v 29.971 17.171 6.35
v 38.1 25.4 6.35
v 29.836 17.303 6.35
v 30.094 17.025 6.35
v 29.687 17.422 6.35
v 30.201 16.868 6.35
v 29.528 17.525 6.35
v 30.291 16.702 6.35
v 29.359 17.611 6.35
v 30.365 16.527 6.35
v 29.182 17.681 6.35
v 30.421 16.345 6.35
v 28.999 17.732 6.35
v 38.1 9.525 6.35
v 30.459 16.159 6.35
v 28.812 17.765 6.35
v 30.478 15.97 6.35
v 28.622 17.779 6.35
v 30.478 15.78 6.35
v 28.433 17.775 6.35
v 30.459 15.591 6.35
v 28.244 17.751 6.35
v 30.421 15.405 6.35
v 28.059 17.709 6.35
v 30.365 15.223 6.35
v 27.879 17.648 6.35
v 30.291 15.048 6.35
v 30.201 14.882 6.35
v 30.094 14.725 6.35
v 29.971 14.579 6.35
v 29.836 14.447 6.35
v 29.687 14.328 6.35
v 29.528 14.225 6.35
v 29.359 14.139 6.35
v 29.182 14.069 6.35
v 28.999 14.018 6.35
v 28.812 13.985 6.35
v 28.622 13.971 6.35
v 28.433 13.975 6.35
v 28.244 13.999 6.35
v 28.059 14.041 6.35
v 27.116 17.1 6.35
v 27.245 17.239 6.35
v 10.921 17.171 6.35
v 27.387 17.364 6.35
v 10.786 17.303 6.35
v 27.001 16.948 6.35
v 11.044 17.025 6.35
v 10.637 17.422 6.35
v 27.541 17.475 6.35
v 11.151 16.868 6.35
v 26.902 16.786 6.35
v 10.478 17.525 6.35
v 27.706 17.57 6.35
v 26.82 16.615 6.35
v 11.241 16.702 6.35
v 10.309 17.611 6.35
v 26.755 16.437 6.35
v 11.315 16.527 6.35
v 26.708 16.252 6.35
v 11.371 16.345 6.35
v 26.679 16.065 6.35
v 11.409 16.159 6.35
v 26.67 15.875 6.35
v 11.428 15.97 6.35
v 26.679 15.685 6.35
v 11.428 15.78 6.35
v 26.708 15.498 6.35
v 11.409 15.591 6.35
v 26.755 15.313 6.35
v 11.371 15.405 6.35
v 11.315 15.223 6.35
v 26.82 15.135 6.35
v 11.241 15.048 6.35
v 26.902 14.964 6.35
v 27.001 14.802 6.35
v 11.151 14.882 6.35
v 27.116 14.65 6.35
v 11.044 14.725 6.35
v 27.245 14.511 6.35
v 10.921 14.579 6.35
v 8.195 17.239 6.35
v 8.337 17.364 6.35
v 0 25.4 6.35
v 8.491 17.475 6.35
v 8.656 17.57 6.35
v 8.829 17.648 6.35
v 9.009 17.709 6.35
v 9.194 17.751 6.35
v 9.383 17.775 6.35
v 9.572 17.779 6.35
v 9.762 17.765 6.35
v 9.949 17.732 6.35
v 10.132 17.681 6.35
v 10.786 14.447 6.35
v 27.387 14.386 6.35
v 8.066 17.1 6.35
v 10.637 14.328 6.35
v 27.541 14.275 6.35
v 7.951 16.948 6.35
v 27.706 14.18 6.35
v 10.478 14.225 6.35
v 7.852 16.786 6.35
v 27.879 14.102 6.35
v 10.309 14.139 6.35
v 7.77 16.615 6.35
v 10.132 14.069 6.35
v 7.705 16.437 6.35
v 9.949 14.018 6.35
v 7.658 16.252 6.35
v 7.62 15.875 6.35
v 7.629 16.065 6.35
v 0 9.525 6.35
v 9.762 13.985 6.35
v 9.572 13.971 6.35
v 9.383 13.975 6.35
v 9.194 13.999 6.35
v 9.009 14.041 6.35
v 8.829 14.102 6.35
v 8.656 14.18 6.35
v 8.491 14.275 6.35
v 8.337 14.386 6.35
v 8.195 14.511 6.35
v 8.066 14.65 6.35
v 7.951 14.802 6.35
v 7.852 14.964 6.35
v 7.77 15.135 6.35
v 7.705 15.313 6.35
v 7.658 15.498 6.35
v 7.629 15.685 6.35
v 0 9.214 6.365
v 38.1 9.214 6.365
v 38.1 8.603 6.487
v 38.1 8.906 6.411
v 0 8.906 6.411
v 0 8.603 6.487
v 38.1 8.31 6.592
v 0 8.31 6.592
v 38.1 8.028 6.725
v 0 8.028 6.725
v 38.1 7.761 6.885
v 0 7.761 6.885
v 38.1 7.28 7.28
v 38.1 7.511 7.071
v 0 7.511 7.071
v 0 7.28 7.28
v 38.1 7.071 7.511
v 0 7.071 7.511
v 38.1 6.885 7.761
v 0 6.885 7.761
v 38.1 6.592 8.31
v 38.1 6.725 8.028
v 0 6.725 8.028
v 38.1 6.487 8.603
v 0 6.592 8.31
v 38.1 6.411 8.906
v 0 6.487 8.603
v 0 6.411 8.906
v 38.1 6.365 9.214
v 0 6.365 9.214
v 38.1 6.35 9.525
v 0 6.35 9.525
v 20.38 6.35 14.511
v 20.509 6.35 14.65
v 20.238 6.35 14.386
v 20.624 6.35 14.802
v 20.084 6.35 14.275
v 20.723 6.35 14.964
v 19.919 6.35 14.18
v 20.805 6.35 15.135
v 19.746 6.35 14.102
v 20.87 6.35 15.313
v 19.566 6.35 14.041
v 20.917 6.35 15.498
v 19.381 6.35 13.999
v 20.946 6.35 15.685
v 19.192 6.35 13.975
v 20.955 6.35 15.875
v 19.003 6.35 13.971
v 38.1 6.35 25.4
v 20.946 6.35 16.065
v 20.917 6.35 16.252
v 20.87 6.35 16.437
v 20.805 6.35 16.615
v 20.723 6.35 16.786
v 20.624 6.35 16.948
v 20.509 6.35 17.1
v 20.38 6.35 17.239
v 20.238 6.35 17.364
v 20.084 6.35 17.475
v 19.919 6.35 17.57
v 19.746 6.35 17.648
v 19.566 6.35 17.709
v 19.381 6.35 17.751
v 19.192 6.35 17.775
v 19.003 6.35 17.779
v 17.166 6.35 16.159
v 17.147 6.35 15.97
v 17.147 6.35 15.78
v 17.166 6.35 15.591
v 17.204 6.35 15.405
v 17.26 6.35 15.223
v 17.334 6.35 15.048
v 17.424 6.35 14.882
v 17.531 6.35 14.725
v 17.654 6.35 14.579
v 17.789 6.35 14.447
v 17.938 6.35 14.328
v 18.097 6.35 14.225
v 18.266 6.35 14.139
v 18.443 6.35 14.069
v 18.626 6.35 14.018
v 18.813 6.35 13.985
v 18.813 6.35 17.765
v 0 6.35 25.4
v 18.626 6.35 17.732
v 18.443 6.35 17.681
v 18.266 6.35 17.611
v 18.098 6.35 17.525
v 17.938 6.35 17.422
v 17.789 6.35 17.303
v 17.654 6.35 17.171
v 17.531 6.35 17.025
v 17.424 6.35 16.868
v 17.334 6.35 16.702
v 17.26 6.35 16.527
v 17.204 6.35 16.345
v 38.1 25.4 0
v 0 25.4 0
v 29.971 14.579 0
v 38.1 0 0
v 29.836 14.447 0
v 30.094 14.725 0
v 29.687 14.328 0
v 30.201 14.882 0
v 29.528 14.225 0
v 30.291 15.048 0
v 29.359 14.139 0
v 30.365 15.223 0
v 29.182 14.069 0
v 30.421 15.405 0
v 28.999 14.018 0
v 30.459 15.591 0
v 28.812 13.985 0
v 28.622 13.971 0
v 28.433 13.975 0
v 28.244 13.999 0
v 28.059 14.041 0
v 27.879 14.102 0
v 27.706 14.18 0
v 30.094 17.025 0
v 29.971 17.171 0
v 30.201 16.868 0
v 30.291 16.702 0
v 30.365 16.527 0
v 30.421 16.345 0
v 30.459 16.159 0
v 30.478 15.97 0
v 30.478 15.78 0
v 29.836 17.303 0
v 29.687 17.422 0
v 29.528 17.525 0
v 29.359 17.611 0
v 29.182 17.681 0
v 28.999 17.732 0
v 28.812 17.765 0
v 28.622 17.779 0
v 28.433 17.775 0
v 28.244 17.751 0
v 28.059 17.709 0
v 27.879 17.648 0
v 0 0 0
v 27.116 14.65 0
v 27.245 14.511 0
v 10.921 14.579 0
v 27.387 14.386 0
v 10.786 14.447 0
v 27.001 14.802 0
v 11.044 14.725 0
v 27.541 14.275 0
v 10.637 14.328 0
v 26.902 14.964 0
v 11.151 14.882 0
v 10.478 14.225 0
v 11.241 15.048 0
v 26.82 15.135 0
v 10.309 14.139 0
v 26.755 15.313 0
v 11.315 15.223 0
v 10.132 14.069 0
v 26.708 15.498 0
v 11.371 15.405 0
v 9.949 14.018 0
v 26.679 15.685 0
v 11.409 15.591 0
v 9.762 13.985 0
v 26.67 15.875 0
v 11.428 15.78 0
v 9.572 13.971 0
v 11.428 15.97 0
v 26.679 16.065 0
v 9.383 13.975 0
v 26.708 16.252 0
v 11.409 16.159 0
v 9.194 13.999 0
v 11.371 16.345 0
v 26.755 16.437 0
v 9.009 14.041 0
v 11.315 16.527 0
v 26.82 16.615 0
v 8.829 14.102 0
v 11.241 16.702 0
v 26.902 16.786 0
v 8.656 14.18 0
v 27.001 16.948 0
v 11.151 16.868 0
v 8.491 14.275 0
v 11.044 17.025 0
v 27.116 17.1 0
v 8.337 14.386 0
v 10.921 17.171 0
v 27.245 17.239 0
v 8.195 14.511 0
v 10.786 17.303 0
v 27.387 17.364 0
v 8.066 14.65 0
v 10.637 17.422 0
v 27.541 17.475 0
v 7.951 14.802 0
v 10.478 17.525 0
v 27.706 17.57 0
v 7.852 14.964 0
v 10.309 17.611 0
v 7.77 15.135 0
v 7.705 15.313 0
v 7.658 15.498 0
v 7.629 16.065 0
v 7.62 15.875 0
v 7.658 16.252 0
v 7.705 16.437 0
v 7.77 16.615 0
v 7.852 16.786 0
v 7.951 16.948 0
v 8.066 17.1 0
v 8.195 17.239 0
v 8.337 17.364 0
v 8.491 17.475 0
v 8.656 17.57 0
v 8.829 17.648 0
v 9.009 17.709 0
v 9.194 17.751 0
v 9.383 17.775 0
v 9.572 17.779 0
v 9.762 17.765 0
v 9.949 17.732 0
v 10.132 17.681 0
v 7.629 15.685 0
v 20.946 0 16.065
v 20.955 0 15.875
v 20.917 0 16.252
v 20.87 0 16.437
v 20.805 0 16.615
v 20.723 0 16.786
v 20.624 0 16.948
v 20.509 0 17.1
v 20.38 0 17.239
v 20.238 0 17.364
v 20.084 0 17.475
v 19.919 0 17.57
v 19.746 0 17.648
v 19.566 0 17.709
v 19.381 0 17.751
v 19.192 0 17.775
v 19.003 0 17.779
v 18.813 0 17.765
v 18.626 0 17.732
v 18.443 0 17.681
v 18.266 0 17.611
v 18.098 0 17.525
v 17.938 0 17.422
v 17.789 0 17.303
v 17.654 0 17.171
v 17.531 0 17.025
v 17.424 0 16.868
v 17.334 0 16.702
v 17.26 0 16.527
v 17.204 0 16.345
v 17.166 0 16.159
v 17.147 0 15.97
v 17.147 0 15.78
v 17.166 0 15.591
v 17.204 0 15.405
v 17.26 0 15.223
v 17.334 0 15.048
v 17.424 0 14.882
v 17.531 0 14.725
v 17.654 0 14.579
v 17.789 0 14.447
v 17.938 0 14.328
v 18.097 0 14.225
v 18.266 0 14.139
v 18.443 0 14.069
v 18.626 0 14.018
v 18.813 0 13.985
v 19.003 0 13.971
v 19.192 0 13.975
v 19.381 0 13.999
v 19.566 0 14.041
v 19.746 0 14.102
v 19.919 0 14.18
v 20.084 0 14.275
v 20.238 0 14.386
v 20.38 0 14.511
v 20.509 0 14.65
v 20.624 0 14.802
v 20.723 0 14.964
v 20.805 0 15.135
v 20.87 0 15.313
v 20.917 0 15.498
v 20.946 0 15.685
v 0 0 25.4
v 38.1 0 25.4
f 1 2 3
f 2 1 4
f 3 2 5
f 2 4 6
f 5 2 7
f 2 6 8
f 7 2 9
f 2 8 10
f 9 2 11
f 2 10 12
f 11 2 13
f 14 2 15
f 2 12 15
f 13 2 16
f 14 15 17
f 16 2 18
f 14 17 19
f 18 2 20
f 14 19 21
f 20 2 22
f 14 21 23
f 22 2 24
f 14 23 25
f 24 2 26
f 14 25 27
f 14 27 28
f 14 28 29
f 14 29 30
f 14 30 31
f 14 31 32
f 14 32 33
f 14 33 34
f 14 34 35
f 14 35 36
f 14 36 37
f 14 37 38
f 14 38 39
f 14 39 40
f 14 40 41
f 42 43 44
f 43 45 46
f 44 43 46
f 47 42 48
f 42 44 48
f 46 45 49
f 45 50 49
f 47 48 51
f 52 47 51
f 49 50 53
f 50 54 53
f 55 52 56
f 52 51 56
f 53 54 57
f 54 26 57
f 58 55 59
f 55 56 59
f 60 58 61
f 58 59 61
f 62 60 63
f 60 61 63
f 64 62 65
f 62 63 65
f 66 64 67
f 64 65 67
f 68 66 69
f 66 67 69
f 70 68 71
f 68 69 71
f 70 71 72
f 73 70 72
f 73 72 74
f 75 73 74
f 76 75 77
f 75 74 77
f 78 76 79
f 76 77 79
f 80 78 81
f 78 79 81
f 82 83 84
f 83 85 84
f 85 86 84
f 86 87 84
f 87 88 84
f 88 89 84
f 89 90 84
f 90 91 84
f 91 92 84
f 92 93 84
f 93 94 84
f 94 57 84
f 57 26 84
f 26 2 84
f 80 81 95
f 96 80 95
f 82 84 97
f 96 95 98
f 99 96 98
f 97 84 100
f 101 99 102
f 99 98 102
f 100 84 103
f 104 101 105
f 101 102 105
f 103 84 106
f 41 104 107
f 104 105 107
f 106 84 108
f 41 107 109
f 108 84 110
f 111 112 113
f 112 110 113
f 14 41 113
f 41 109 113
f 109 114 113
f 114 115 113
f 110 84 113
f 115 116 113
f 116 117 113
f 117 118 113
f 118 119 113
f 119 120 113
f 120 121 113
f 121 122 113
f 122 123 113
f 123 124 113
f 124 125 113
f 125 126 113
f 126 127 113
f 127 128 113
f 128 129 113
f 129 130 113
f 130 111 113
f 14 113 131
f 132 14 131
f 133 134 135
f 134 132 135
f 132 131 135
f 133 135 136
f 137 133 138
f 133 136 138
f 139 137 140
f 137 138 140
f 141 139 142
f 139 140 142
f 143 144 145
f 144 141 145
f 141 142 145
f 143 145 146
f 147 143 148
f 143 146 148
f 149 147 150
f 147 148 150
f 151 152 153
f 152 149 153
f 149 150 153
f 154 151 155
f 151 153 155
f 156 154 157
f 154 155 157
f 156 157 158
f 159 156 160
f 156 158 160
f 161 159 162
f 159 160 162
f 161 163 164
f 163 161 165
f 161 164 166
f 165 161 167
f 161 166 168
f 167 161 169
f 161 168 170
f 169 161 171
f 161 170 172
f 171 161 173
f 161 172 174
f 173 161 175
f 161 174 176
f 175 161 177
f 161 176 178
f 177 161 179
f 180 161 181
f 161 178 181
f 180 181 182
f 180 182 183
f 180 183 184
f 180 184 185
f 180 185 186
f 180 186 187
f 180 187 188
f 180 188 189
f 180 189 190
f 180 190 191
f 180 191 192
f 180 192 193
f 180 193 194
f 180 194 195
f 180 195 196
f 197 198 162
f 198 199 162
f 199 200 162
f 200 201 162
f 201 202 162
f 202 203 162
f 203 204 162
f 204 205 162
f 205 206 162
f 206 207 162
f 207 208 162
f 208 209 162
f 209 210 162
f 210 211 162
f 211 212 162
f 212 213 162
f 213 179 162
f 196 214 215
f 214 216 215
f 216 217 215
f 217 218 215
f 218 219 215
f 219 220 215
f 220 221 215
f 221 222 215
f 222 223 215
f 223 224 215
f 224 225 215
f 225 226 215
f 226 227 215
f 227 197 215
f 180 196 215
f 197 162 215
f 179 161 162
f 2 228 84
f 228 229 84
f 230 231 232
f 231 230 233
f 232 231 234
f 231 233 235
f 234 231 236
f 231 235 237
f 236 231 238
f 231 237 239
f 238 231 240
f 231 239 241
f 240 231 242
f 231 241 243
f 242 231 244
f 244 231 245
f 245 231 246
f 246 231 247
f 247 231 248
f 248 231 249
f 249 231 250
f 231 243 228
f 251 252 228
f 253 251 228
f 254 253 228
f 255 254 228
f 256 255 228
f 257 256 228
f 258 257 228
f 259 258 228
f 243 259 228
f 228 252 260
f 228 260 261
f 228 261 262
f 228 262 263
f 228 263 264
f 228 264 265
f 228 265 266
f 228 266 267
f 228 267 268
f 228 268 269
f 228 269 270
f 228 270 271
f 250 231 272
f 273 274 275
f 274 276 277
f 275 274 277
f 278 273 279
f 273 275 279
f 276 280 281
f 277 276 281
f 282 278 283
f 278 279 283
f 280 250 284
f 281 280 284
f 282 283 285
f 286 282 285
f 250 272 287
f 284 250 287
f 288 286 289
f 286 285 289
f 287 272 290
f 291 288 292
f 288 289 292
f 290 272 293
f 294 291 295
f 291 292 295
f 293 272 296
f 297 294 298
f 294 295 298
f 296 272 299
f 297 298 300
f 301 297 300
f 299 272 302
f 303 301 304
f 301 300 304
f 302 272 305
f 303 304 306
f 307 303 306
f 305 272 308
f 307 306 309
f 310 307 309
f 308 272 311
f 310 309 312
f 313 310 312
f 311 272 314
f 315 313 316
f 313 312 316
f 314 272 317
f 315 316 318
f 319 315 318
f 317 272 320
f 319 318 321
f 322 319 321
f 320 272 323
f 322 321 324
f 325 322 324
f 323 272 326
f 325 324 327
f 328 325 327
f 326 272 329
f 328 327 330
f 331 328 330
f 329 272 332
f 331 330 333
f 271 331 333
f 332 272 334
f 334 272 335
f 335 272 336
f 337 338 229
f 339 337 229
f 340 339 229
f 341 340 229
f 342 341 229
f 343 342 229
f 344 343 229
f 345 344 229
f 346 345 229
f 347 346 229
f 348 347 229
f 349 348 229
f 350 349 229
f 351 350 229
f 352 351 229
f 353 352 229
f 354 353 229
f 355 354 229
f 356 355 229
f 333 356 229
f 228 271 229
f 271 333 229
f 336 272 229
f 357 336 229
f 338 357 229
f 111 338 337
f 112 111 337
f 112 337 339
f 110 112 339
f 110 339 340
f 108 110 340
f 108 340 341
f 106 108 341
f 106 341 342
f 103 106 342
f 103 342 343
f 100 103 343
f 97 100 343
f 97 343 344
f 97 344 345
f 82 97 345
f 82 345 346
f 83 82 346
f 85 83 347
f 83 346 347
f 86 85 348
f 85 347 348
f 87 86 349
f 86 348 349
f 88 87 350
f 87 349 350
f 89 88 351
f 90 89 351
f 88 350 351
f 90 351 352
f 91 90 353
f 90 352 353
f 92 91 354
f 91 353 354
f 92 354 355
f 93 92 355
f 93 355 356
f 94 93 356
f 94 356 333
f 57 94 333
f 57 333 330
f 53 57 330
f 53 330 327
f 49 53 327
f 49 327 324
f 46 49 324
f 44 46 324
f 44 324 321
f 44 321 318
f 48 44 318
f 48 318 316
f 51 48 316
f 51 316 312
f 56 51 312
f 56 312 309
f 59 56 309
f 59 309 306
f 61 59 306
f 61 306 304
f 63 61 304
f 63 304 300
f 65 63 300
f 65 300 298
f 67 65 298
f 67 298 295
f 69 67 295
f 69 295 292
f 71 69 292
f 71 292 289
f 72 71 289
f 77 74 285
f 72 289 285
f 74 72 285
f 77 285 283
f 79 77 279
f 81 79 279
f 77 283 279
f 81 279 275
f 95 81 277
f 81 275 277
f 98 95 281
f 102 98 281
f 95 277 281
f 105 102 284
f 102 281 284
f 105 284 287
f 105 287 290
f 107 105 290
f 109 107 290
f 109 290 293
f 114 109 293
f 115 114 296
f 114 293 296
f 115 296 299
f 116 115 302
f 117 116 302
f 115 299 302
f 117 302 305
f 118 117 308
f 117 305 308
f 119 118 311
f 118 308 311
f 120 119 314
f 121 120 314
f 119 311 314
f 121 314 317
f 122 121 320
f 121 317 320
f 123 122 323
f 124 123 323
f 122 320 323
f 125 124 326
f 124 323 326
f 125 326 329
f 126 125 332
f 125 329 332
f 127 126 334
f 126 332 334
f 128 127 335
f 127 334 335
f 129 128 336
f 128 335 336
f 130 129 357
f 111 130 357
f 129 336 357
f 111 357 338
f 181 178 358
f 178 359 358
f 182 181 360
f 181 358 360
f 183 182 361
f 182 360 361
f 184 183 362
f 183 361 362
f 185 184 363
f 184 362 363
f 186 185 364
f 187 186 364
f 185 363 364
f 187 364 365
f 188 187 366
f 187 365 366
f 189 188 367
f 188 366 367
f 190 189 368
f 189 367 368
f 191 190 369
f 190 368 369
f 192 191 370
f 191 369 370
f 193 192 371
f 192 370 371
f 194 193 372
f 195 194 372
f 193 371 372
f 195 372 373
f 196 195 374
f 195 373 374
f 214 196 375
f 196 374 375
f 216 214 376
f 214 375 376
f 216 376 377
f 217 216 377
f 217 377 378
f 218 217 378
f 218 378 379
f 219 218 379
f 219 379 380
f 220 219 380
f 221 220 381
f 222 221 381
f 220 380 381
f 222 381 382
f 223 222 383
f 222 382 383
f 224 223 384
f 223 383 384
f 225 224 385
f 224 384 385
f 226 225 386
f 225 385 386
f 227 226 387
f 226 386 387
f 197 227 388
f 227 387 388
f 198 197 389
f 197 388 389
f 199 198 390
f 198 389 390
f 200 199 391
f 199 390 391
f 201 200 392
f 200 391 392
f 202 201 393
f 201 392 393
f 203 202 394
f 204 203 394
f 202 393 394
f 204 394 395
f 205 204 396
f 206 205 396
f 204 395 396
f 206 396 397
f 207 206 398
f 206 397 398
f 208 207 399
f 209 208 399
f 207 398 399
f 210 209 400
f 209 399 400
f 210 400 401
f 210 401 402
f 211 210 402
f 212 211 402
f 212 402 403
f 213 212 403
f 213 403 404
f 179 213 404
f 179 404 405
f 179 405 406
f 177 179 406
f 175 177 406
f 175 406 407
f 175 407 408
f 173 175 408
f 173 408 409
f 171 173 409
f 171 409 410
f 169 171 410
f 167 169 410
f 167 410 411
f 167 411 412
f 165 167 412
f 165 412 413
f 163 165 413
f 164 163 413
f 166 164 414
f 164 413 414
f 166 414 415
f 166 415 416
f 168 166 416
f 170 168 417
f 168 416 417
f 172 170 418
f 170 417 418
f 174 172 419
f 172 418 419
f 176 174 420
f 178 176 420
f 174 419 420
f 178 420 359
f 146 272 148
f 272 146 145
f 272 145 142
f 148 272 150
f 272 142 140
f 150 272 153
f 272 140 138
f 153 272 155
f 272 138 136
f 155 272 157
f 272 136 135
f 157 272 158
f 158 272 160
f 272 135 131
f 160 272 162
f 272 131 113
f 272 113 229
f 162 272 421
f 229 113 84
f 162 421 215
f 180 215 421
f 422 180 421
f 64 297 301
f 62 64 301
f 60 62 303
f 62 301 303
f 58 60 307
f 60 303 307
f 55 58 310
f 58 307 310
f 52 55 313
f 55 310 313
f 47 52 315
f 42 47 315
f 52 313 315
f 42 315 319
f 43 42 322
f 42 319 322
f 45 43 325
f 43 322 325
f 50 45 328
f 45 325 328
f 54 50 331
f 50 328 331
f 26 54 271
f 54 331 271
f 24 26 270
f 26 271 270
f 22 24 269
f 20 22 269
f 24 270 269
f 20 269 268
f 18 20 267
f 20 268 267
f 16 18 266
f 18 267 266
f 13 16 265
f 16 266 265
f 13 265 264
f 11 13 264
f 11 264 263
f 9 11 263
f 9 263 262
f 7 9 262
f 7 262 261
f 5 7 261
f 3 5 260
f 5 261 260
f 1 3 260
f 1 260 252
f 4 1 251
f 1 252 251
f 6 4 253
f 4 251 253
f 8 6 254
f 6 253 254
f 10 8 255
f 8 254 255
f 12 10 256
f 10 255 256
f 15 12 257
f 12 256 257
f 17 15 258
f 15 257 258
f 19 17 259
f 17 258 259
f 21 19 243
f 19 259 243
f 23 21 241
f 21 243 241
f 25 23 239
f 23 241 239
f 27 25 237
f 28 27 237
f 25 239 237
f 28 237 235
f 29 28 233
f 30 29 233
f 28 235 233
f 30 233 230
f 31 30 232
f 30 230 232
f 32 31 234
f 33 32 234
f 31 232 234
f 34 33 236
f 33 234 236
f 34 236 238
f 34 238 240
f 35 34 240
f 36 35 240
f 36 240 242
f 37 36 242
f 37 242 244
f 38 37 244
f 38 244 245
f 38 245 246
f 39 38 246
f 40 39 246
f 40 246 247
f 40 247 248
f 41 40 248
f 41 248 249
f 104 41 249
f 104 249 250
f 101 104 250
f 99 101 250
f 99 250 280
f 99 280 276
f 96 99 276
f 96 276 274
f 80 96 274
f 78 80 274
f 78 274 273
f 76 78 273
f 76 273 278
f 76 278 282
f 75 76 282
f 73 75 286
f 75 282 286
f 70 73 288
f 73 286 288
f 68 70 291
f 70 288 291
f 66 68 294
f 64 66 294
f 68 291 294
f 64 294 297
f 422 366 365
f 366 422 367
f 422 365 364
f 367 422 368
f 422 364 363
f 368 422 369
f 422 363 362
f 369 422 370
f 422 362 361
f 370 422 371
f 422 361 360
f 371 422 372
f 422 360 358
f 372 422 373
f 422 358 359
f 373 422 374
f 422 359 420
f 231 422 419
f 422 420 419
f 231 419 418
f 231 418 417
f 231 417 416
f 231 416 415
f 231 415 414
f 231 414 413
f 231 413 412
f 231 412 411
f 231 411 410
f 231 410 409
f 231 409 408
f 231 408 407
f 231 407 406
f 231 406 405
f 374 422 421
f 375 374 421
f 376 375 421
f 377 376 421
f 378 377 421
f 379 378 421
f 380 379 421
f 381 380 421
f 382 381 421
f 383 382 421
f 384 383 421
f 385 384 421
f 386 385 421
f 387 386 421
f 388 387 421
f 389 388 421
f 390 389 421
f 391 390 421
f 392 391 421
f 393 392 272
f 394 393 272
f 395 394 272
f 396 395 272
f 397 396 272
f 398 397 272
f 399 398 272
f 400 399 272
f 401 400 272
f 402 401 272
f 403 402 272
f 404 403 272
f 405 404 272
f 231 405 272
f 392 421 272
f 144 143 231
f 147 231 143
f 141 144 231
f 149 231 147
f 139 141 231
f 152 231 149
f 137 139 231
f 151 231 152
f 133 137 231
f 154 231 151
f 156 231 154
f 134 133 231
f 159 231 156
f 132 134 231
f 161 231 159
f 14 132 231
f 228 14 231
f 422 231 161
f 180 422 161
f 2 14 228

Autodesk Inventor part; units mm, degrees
ref_plane "YZ Plane" through (0, 0, 0) normal (1, 0, 0) x (0, 1, 0)
ref_plane "XZ Plane" through (0, 0, 0) normal (0, 1, 0) x (-1, 0, 0)
ref_plane "XY Plane" through (0, 0, 0) normal (0, 0, 1) x (1, 0, 0)
sketch "Sketch1" plane through (0, 0, 0) normal (1, 0, 0) x (0, 1, 0)
  line L0 (0, 25.4) -> (0, 0)
  line L1 (0, 0) -> (25.4, 0)
  line L2 (25.4, 0) -> (25.4, 6.35)
  line L3 (25.4, 6.35) -> (9.525, 6.35)
  line L4 (6.35, 9.525) -> (6.35, 25.4)
  line L5 (6.35, 25.4) -> (0, 25.4)
  arc A0 (6.35, 9.525) -> (9.525, 6.35) centre (9.525, 9.525) ccw
  dimension "d0" = 3.175
  dimension "d1" = 25.4
  dimension "d2" = 6.35
extrude "Extrusion1" add sketch "Sketch1" along normal blind 38.1
sketch "Sketch2" plane through (0, 0, 0) normal (0, 0, -1) x (-1, 0, 0)
  line L0 (0, 6.35) -> (-38.1, 6.35) construction
  line L1 (0, 25.4) -> (-38.1, 25.4) construction
  circle A0 centre (-28.575, 15.875) radius 1.905
  line L2 (-28.575, 25.4) -> (-28.575, 6.35) construction
  line L3 (-19.05, 6.35) -> (-19.05, 25.4) construction
  line L4 (-9.525, 25.4) -> (-9.525, 6.35) construction
  circle A1 centre (-9.525, 15.875) radius 1.905
  point P0 (0, 0)
  dimension "d5" = 3.81
  dimension "d11" = 19.05
extrude "Extrusion2" cut sketch "Sketch2" against normal through all
sketch "Sketch3" plane through (0, 0, 0) normal (0, -1, 0) x (1, 0, 0)
  line L0 (0, 6.35) -> (38.1, 6.35) construction
  line L1 (26.67, 6.35) -> (30.48, 6.35) construction
  line L2 (0, 25.4) -> (38.1, 25.4) construction
  circle A0 centre (19.05, 15.875) radius 1.905
  line L3 (0, 25.4) -> (38.1, 25.4) construction
  line L4 (19.05, 25.4) -> (19.05, 6.35) construction
  point P0 (0, 0)
  point P1 (19.05, 15.875)
  dimension "d8" = 3.81
extrude "Extrusion3" cut sketch "Sketch3" against normal through all
properties part number "Tension Angle"
